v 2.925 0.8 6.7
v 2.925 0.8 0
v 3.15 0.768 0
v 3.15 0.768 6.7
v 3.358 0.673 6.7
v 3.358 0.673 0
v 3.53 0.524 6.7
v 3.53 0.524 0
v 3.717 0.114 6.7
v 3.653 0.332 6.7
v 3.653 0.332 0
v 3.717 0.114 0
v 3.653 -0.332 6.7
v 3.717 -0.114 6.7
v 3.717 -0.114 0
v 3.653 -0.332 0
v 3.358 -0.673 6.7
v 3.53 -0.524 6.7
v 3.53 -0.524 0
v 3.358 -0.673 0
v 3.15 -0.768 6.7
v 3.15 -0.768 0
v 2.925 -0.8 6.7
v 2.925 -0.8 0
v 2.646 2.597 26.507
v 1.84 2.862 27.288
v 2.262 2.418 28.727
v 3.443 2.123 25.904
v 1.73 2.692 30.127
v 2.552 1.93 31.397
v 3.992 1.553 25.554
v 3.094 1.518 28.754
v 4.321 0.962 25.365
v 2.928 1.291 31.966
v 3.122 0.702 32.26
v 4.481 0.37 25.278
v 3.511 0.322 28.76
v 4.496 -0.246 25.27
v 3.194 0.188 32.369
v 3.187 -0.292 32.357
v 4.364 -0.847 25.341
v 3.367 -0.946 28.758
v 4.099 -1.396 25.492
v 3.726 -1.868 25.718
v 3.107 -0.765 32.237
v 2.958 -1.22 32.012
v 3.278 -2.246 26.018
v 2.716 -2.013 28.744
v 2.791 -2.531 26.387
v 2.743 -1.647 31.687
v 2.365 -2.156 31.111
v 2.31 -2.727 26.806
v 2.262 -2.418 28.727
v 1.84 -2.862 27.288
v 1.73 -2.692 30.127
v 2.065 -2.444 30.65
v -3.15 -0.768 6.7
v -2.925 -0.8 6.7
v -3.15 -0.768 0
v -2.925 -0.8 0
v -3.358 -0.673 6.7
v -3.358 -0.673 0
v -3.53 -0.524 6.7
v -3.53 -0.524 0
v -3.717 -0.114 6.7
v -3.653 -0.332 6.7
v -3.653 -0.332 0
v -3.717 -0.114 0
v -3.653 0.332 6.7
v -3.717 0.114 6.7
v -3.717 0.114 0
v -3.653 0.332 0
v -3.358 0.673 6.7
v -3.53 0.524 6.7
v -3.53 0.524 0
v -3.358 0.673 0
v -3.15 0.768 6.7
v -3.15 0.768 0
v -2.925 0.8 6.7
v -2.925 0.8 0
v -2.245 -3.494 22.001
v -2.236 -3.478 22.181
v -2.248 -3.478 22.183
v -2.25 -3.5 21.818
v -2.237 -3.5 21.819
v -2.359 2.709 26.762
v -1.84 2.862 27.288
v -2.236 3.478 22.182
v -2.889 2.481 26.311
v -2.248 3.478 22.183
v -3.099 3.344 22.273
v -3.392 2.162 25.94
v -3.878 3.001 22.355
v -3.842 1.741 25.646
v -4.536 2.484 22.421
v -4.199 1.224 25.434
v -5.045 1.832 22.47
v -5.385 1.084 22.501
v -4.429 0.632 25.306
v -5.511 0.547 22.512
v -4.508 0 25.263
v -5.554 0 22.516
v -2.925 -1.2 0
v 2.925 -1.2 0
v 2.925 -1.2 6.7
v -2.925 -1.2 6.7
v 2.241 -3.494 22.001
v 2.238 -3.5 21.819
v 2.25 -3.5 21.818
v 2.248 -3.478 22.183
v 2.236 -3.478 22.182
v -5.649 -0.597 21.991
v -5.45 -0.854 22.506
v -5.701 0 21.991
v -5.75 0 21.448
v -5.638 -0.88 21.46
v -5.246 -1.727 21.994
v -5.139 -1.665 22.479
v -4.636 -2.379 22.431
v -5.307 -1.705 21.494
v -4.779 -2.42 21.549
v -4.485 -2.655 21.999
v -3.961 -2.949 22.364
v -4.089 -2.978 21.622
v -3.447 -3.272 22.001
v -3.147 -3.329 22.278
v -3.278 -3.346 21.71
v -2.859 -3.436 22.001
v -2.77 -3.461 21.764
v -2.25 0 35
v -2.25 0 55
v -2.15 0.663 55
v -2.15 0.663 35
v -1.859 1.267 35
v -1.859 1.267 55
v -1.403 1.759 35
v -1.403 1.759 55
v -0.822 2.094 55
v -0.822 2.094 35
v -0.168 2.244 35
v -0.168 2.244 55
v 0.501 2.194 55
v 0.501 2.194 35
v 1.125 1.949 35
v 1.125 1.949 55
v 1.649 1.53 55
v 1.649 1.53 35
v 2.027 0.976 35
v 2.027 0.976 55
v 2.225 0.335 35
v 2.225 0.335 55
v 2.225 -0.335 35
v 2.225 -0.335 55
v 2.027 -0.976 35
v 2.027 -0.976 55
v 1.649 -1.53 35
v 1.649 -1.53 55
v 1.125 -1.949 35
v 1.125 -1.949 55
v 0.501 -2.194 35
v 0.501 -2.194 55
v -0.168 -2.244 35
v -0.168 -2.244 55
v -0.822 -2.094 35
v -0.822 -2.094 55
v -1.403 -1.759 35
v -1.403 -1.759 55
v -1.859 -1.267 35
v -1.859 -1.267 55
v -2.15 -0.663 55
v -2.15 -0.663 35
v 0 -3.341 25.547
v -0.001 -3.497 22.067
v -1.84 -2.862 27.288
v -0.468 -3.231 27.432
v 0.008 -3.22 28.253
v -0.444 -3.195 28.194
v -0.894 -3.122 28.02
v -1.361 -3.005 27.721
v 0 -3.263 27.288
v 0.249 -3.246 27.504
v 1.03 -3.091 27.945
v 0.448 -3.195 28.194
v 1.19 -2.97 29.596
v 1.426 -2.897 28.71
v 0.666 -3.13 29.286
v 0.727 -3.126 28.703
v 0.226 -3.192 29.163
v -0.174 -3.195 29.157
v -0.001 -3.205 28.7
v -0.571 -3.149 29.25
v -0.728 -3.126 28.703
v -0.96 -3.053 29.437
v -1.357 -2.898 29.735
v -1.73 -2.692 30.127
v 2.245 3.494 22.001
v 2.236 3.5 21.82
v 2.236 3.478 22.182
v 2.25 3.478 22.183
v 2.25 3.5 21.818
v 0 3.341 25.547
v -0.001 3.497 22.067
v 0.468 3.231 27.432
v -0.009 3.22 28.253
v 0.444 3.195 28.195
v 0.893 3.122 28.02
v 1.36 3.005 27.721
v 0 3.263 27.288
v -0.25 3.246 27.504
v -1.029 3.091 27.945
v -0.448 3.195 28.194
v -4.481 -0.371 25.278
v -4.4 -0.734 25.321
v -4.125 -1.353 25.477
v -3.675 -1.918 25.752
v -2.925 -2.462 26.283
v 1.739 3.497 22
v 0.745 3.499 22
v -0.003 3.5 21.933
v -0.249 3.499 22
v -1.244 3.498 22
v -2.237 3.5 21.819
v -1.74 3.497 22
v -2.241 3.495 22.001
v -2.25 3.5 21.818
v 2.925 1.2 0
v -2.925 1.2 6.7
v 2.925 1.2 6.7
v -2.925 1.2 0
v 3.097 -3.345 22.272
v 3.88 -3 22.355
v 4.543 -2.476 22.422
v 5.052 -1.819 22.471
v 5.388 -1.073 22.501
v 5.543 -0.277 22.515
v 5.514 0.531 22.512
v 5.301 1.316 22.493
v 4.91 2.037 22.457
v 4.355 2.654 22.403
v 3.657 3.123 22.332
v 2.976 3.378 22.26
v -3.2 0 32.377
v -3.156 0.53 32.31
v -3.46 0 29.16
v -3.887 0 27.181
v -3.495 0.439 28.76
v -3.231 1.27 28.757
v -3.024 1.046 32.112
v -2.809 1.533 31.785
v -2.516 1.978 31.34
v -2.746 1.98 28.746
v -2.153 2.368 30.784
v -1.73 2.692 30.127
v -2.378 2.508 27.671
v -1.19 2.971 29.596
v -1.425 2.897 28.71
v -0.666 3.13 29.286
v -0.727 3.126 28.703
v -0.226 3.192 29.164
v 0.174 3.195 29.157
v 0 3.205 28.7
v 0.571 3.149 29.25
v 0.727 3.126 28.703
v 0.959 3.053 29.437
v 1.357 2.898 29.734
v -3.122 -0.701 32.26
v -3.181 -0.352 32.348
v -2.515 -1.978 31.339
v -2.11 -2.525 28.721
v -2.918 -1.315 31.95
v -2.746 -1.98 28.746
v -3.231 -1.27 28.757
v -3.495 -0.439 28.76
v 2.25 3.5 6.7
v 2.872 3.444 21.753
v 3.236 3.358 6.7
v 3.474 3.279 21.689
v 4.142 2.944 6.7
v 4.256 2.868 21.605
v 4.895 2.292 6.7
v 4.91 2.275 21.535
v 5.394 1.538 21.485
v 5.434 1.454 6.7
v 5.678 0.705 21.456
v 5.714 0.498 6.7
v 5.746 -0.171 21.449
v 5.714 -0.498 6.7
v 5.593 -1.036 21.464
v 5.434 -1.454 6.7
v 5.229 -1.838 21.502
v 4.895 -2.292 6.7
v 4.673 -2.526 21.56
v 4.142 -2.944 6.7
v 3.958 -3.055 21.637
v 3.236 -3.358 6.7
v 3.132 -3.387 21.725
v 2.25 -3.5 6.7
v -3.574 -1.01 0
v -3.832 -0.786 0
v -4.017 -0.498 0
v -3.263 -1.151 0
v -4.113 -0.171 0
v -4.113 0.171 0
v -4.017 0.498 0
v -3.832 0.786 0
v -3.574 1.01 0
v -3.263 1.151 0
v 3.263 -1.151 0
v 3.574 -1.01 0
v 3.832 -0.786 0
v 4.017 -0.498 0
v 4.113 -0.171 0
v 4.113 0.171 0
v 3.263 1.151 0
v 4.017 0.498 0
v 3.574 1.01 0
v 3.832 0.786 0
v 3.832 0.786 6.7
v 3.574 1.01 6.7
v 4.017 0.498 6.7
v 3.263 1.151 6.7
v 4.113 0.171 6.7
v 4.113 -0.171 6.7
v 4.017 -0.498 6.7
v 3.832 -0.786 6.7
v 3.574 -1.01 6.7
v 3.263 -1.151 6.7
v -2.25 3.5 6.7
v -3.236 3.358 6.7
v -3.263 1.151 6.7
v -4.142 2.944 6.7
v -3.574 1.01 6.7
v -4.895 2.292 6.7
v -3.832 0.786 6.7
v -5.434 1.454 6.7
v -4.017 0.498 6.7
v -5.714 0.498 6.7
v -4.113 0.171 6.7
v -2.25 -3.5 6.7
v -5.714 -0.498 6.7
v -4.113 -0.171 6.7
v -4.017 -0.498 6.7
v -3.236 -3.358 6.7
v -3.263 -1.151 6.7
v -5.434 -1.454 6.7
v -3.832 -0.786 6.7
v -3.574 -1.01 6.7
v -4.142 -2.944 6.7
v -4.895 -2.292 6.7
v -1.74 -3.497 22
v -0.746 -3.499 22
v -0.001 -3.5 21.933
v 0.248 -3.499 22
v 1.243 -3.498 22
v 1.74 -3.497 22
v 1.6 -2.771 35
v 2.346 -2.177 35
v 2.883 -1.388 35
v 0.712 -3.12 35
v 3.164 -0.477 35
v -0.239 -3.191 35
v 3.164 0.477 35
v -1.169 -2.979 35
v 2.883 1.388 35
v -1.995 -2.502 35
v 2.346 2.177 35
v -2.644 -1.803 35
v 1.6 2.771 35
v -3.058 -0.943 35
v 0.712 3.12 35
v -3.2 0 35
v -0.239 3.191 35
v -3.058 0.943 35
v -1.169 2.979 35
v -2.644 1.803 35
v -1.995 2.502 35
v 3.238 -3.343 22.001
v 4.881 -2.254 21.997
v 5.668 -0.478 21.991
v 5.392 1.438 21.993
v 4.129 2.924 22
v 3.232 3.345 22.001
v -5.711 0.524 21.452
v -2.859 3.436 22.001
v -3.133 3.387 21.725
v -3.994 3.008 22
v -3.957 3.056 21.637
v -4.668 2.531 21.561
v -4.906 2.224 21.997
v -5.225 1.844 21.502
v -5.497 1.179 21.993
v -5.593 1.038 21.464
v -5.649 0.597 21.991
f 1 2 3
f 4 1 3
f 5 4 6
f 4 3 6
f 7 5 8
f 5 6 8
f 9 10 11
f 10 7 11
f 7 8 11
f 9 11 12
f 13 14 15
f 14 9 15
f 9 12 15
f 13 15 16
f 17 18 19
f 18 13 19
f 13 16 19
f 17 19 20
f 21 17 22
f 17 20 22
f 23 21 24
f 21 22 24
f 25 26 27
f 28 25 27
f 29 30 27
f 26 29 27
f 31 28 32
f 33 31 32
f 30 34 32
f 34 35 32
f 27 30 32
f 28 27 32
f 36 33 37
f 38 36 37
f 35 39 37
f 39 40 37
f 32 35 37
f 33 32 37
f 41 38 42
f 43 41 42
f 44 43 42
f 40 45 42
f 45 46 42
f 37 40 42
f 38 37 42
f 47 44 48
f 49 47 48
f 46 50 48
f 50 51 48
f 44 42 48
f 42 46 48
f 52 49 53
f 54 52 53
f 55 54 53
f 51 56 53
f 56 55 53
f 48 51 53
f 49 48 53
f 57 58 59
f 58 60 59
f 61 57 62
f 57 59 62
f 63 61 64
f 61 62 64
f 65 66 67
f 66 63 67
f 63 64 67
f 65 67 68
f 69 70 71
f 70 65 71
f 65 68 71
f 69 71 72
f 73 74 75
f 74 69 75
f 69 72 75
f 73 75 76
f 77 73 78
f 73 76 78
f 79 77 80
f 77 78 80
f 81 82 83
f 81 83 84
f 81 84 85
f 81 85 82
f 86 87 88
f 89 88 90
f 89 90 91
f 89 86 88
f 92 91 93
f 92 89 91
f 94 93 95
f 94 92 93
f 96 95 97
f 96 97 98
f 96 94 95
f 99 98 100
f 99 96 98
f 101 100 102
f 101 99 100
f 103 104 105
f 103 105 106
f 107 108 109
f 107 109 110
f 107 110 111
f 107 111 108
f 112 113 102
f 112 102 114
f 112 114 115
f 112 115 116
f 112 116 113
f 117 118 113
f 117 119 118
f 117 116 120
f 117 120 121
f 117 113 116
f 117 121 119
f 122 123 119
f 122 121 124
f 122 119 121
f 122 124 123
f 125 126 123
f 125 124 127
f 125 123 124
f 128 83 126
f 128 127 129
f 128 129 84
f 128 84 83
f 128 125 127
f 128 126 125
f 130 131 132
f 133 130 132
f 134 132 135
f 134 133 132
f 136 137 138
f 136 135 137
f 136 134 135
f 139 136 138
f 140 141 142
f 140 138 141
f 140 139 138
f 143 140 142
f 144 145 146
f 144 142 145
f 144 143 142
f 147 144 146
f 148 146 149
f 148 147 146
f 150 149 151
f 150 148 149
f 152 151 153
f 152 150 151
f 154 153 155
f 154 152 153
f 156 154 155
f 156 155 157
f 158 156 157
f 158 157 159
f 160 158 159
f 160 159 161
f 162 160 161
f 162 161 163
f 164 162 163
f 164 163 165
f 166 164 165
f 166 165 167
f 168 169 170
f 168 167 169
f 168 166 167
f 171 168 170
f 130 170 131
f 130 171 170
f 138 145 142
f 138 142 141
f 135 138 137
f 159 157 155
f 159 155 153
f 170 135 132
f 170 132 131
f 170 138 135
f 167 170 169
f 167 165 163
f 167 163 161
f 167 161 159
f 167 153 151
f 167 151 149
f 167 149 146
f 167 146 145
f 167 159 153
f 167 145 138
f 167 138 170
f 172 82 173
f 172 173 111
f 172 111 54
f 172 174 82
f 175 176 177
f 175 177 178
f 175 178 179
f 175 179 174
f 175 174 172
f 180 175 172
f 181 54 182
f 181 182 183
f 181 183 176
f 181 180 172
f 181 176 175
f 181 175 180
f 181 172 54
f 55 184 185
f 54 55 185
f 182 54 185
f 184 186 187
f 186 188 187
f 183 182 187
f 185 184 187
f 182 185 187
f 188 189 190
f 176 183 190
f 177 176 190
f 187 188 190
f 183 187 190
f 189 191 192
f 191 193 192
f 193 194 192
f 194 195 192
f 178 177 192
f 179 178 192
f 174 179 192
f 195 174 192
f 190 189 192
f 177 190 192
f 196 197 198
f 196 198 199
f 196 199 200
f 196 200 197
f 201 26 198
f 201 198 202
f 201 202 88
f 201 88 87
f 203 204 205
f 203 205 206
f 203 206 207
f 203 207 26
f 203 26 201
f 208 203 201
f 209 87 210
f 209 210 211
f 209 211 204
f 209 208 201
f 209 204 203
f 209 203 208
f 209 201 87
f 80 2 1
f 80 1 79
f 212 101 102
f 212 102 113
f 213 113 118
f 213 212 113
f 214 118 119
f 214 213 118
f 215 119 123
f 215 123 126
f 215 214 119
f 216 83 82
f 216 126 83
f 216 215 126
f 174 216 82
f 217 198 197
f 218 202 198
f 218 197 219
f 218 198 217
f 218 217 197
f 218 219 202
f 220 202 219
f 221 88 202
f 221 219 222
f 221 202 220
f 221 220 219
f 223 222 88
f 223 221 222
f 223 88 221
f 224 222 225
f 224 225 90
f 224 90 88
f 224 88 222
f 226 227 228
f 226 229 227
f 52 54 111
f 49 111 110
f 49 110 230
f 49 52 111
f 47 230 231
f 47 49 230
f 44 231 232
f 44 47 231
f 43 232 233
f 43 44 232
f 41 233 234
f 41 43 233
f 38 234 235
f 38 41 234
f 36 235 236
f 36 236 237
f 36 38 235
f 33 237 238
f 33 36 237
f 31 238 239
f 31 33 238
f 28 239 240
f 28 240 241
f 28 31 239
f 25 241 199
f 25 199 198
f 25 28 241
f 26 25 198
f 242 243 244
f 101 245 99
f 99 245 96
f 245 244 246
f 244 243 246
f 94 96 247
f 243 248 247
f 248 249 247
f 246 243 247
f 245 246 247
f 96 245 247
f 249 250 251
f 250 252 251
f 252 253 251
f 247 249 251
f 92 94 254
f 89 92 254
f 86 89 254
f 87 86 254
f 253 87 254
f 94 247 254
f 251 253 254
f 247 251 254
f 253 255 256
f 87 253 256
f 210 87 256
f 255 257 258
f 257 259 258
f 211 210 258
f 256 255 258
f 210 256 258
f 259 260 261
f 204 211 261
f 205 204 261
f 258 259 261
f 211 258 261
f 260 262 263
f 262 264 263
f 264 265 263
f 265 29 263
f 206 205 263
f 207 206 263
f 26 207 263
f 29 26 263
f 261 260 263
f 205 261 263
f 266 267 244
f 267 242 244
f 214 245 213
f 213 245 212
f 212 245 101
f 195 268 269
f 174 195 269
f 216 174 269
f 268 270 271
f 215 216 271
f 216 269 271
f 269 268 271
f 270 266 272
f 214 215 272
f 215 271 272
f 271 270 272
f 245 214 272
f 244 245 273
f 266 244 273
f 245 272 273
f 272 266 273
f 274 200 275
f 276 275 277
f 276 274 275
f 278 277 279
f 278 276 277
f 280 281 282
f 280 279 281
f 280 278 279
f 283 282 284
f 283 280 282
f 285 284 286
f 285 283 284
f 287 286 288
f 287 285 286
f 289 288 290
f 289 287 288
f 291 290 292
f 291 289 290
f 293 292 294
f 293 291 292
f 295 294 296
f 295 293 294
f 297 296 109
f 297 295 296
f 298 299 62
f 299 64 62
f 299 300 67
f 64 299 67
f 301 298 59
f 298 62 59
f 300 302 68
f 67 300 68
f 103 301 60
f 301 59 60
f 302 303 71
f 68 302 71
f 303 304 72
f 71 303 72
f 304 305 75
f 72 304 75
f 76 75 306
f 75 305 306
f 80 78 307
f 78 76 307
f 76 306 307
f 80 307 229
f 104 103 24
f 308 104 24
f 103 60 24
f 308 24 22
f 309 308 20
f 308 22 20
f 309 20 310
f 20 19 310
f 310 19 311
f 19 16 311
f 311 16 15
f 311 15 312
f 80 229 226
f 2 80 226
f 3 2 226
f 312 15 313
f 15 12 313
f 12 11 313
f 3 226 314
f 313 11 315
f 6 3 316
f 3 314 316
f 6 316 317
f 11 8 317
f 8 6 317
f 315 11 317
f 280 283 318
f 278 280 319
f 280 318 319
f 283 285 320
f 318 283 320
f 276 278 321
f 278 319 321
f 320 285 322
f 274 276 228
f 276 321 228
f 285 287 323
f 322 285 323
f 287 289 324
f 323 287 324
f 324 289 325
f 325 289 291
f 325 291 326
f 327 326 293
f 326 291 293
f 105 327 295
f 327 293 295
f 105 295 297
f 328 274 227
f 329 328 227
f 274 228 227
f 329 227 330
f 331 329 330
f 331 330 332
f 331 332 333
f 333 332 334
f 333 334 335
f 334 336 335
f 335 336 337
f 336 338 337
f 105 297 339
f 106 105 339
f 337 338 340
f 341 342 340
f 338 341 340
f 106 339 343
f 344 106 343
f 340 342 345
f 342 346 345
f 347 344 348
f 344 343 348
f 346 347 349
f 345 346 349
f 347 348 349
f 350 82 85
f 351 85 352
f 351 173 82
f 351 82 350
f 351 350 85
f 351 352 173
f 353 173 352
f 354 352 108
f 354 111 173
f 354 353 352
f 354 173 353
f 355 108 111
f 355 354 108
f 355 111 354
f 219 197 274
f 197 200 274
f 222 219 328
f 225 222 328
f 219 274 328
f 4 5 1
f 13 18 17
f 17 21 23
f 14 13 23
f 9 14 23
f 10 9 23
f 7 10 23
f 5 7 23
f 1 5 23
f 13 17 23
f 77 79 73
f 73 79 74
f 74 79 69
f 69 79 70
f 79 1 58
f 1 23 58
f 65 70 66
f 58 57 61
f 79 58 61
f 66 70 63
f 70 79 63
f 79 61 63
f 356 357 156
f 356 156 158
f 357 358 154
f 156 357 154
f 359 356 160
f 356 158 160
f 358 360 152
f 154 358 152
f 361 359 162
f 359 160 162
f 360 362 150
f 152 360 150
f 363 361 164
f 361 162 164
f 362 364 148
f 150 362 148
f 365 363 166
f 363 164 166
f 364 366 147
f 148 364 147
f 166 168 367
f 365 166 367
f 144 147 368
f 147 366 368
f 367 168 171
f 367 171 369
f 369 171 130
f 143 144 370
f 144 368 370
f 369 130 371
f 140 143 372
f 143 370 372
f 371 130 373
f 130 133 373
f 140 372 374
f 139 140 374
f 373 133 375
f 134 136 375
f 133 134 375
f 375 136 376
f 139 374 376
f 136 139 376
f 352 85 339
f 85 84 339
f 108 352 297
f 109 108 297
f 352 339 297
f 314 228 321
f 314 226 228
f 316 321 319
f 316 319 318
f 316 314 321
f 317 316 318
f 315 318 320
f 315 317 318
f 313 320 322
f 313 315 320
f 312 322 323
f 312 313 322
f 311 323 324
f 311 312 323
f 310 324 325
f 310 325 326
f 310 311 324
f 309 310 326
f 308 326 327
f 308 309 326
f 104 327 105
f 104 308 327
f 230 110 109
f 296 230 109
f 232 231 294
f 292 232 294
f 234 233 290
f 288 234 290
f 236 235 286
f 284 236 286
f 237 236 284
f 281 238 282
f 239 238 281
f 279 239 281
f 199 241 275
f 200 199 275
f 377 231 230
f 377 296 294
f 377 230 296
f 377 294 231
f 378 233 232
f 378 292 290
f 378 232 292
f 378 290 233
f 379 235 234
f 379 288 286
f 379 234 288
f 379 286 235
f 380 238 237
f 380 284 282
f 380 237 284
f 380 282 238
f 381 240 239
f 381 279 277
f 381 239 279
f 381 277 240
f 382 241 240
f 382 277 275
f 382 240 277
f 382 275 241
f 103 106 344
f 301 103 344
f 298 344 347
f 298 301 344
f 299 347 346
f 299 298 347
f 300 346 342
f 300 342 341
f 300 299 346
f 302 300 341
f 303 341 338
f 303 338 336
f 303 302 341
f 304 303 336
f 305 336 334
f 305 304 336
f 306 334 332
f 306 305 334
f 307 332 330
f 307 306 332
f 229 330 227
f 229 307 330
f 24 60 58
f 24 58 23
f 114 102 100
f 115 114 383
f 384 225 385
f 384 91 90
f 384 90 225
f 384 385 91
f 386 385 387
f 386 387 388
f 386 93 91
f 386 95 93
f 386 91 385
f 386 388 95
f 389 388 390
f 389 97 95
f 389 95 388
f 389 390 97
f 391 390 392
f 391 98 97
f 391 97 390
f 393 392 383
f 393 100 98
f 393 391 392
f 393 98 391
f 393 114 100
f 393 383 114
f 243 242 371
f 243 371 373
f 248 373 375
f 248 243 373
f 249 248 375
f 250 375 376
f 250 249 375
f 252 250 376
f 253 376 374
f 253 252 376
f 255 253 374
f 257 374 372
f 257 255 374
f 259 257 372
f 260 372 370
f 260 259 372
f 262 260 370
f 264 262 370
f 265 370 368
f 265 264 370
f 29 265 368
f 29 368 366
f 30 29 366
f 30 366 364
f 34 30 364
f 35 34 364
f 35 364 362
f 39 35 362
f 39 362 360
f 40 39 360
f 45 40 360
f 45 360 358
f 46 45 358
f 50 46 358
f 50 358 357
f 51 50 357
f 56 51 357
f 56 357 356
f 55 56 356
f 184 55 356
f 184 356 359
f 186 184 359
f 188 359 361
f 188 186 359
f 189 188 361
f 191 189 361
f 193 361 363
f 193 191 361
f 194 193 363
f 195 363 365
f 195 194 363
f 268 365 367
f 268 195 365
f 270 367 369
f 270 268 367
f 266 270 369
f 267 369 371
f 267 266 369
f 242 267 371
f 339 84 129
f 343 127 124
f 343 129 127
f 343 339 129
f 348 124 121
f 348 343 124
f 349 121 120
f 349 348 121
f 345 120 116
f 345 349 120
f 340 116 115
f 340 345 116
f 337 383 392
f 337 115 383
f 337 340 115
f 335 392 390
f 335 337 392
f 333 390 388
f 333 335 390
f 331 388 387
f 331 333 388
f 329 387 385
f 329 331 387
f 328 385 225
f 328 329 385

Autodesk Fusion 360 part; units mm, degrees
sketch "Sketch1" plane through (0, 0, 0) normal (0, 0, 1) x (1, 0, 0)
  line L0 (-4.125, 1.2) -> (4.125, 1.2)
  line L1 (4.125, 1.2) -> (4.125, -1.2)
  line L2 (4.125, -1.2) -> (-4.125, -1.2)
  line L3 (-4.125, -1.2) -> (-4.125, 1.2)
  line L4 (-4.125, 1.2) -> (4.125, -1.2) construction
  line L5 (4.125, 1.2) -> (-4.125, -1.2) construction
  circle A0 centre (-2.925, 0) radius 1.2
  circle A1 centre (2.925, 0) radius 1.2
  line L6 (-2.925, -0.8) -> (2.925, -0.8)
  arc A2 (2.925, -0.8) -> (2.925, 0.8) centre (2.925, 0) ccw
  line L7 (2.925, 0.8) -> (-2.925, 0.8)
  arc A3 (-2.925, 0.8) -> (-2.925, -0.8) centre (-2.925, 0) ccw
  line L8 (-2.925, 0) -> (2.925, 0) construction
  dimension "d1" = 8.25
  dimension "d2" = 2.4
  dimension "d3" = 0.4
extrude "Extrude1" add sketch "Sketch1" along normal blind 6.7 contours L0 A0 A1 L7 | A0 L6 L7 A3 | A1 L6 A2 L7 | L2 A0 A1 L6 picked at (-3.9868, -0.0769) picked at (3.9868, -0.0769)
sketch "Sketch2" plane through (0, 0, 6.7) normal (0, 0, 1) x (-1, 0, 0)
  arc A0 (2.925, -0.8) -> (2.925, 0.8) centre (2.925, 0) ccw
  line L0 (2.925, -0.8) -> (-2.925, -0.8)
  arc A1 (-2.925, 0.8) -> (-2.925, -0.8) centre (-2.925, 0) ccw
  line L1 (-2.925, 0.8) -> (2.925, 0.8)
  arc A2 (2.925, -1.2) -> (2.925, 1.2) centre (2.925, 0) ccw
  line L2 (2.925, 1.2) -> (-2.925, 1.2)
  arc A3 (-2.925, 1.2) -> (-2.925, -1.2) centre (-2.925, 0) ccw
  line L3 (-2.925, -1.2) -> (2.925, -1.2)
  line L4 (2.25, 3.5) -> (-2.25, 3.5)
  arc A4 (-2.25, 3.5) -> (-2.25, -3.5) centre (-2.25, 0) ccw
  line L5 (-2.25, -3.5) -> (2.25, -3.5)
  arc A5 (2.25, -3.5) -> (2.25, 3.5) centre (2.25, 0) ccw
  line L6 (2.25, 0) -> (-2.25, 0) construction
  line L7 (5.75, 0) -> (5.75, -5.6994) construction
  line L8 (-5.75, 0) -> (-5.75, -5.542) construction
  dimension "d7" = 7
  dimension "d8" = 11.5
extrude "Extrude2" add sketch "Sketch2" along normal blind 15.3 contours A0 L0 A1 L1 | A2 L2 A3 L3 | L4 A4 L5 A5
ref_plane "WorkPlane2" through (0, 0, 28.7) normal (0, 0, -1) x (1, 0, 0)
sketch "Sketch3" plane through (0, 0, 28.7) normal (0, 0, -1) x (-1, 0, 0)
  circle A0 centre (0, 0) radius 3.2
  dimension "d12" = 6.4
loft "Loft1" add profiles "Sketch3" section 1 face at (-0.75, 1.1667, 22) section 2
extrude "Extrude3" add sketch "Sketch3" against normal blind 6.3
fillet "Fillet1" radius 20 4 edges at (0.3491, 3.1809, 28.7) (3.1809, -0.3491, 28.7) (-0.3491, -3.1809, 28.7) (-3.1809, 0.3491, 28.7)
fillet "Fillet3" radius 3 4 edges at (0, 3.5, 22) (-5.75, 0, 22) (0, -3.5, 22) (5.75, 0, 22)
sketch "Sketch4" plane through (0, 0, 35) normal (0, 0, 1) x (-1, 0, 0)
  circle A0 centre (0, 0) radius 3.2
  circle A1 centre (0, 0) radius 2.25
  dimension "d23" = 4.5
extrude "Extrude4" add sketch "Sketch4" along normal blind 20 contours A1
